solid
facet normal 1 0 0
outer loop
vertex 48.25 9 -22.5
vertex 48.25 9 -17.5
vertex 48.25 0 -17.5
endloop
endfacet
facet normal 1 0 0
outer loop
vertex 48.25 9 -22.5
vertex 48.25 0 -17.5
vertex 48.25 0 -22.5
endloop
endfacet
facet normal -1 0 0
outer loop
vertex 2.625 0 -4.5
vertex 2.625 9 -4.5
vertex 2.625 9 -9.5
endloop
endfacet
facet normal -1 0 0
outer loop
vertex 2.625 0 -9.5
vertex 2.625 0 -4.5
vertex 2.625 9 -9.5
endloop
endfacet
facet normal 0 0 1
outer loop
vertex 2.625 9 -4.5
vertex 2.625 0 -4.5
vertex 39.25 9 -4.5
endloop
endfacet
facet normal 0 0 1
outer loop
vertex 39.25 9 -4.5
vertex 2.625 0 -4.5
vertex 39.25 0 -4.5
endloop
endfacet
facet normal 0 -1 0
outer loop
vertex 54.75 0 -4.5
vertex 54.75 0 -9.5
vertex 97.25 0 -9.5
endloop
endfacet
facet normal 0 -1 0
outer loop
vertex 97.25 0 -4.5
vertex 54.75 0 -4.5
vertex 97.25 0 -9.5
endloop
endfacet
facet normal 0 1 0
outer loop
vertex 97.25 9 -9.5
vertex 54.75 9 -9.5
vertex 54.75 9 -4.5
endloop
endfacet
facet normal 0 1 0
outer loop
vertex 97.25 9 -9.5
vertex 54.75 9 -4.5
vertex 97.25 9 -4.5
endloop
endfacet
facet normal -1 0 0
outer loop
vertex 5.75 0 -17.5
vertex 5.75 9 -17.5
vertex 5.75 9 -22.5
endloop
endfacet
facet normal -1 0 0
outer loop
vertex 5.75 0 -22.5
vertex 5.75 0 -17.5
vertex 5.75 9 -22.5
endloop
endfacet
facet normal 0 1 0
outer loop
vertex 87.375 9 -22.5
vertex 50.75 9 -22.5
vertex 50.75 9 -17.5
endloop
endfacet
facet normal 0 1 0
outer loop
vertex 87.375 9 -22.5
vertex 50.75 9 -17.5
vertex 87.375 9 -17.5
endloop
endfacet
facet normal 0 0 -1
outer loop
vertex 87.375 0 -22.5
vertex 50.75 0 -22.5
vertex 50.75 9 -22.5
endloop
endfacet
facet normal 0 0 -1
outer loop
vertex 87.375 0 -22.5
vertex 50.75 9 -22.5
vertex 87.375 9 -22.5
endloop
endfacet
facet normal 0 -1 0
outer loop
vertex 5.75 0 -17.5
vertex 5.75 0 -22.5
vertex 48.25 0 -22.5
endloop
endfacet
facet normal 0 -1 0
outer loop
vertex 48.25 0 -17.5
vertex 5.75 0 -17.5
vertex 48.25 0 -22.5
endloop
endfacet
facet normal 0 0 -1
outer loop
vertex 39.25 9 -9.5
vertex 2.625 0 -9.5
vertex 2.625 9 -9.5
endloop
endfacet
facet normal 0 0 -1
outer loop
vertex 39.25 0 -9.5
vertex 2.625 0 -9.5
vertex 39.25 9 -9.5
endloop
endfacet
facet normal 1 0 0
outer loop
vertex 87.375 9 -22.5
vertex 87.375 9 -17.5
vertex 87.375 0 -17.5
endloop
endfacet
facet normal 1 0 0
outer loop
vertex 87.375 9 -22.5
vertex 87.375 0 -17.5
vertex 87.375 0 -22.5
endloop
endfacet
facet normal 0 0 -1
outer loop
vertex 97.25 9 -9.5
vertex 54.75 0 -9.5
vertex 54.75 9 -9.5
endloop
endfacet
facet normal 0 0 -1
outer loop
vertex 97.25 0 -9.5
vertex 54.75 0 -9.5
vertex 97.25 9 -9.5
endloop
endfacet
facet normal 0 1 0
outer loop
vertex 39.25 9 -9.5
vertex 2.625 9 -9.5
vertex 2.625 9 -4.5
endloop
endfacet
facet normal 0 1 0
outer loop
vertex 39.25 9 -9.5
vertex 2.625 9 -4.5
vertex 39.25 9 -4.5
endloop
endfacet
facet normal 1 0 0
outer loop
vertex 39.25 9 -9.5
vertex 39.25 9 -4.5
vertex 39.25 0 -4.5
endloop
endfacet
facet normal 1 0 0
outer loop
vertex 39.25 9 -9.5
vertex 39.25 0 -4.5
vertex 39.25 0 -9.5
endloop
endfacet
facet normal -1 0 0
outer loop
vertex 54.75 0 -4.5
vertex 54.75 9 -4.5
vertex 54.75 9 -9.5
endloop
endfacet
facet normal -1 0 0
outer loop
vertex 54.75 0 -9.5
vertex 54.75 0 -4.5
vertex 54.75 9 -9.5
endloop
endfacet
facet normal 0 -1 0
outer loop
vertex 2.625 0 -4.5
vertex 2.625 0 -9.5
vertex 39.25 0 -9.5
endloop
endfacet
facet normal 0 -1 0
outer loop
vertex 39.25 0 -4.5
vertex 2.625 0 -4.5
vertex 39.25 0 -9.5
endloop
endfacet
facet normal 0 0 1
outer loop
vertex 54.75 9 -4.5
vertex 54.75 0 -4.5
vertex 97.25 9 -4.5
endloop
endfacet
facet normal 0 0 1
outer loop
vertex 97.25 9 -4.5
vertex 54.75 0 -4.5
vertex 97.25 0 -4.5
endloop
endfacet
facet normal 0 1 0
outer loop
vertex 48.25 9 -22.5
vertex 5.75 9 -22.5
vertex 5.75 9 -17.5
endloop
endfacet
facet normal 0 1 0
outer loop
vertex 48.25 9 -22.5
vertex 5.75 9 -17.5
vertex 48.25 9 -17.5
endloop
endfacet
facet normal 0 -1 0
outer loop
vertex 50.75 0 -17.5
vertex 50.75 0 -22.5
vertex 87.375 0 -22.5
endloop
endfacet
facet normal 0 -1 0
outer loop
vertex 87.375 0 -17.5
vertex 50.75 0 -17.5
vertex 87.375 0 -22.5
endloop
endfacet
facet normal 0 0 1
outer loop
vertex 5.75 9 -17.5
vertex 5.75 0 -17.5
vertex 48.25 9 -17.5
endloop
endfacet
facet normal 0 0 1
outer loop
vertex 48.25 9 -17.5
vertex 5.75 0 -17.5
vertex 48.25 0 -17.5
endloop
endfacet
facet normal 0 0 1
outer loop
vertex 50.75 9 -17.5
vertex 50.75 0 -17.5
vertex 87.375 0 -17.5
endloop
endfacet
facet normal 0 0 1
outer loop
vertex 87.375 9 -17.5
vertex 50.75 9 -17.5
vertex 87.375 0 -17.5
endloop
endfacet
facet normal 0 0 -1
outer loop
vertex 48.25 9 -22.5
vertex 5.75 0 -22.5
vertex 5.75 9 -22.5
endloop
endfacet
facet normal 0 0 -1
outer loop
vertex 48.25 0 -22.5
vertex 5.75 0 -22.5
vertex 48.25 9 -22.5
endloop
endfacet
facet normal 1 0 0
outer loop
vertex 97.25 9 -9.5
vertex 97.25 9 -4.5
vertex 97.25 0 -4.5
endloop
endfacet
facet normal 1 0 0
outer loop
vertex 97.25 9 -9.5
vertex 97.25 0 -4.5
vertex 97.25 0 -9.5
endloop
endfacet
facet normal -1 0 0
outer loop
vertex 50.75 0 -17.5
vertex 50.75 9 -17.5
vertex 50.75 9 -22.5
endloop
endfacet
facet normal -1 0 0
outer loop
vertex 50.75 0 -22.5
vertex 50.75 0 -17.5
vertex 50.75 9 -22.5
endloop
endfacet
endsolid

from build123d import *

# Parameters (mm, degrees)
SKETCH1_W             = 42.5
SKETCH1_H             = 5
BOSS_EXTRUDE1_DEPTH   = 9
SKETCH1_W_2           = 36.625
BOSS_EXTRUDE1_2_DEPTH = 9
BOSS_EXTRUDE1_3_DEPTH = 9
BOSS_EXTRUDE1_4_DEPTH = 9


with BuildPart() as part:
    # Sketch1 → Boss-Extrude1 (new body)
    with BuildSketch(Plane(origin=(0, 0, 0), x_dir=(1, 0, 0), z_dir=(0, 1, 0))):
        with Locations((76, 7)):
            Rectangle(SKETCH1_W, SKETCH1_H)
    extrude(amount=BOSS_EXTRUDE1_DEPTH)


with BuildPart() as body_2:
    # Sketch1 → Boss-Extrude1 2 (new body)
    with BuildSketch(Plane(origin=(0, 0, 0), x_dir=(1, 0, 0), z_dir=(0, 1, 0))):
        with Locations((20.9375, 7)):
            Rectangle(SKETCH1_W_2, SKETCH1_H)
    extrude(amount=BOSS_EXTRUDE1_2_DEPTH)


with BuildPart() as body_3:
    # Sketch1 → Boss-Extrude1 3 (new body)
    with BuildSketch(Plane(origin=(0, 0, 0), x_dir=(1, 0, 0), z_dir=(0, 1, 0))):
        with Locations((69.0625, 20)):
            Rectangle(SKETCH1_W_2, SKETCH1_H)
    extrude(amount=BOSS_EXTRUDE1_3_DEPTH)


with BuildPart() as body_4:
    # Sketch1 → Boss-Extrude1 4 (new body)
    with BuildSketch(Plane(origin=(0, 0, 0), x_dir=(1, 0, 0), z_dir=(0, 1, 0))):
        with Locations((27, 20)):
            Rectangle(SKETCH1_W, SKETCH1_H)
    extrude(amount=BOSS_EXTRUDE1_4_DEPTH)


solid = Compound([part.part, body_2.part, body_3.part, body_4.part])
